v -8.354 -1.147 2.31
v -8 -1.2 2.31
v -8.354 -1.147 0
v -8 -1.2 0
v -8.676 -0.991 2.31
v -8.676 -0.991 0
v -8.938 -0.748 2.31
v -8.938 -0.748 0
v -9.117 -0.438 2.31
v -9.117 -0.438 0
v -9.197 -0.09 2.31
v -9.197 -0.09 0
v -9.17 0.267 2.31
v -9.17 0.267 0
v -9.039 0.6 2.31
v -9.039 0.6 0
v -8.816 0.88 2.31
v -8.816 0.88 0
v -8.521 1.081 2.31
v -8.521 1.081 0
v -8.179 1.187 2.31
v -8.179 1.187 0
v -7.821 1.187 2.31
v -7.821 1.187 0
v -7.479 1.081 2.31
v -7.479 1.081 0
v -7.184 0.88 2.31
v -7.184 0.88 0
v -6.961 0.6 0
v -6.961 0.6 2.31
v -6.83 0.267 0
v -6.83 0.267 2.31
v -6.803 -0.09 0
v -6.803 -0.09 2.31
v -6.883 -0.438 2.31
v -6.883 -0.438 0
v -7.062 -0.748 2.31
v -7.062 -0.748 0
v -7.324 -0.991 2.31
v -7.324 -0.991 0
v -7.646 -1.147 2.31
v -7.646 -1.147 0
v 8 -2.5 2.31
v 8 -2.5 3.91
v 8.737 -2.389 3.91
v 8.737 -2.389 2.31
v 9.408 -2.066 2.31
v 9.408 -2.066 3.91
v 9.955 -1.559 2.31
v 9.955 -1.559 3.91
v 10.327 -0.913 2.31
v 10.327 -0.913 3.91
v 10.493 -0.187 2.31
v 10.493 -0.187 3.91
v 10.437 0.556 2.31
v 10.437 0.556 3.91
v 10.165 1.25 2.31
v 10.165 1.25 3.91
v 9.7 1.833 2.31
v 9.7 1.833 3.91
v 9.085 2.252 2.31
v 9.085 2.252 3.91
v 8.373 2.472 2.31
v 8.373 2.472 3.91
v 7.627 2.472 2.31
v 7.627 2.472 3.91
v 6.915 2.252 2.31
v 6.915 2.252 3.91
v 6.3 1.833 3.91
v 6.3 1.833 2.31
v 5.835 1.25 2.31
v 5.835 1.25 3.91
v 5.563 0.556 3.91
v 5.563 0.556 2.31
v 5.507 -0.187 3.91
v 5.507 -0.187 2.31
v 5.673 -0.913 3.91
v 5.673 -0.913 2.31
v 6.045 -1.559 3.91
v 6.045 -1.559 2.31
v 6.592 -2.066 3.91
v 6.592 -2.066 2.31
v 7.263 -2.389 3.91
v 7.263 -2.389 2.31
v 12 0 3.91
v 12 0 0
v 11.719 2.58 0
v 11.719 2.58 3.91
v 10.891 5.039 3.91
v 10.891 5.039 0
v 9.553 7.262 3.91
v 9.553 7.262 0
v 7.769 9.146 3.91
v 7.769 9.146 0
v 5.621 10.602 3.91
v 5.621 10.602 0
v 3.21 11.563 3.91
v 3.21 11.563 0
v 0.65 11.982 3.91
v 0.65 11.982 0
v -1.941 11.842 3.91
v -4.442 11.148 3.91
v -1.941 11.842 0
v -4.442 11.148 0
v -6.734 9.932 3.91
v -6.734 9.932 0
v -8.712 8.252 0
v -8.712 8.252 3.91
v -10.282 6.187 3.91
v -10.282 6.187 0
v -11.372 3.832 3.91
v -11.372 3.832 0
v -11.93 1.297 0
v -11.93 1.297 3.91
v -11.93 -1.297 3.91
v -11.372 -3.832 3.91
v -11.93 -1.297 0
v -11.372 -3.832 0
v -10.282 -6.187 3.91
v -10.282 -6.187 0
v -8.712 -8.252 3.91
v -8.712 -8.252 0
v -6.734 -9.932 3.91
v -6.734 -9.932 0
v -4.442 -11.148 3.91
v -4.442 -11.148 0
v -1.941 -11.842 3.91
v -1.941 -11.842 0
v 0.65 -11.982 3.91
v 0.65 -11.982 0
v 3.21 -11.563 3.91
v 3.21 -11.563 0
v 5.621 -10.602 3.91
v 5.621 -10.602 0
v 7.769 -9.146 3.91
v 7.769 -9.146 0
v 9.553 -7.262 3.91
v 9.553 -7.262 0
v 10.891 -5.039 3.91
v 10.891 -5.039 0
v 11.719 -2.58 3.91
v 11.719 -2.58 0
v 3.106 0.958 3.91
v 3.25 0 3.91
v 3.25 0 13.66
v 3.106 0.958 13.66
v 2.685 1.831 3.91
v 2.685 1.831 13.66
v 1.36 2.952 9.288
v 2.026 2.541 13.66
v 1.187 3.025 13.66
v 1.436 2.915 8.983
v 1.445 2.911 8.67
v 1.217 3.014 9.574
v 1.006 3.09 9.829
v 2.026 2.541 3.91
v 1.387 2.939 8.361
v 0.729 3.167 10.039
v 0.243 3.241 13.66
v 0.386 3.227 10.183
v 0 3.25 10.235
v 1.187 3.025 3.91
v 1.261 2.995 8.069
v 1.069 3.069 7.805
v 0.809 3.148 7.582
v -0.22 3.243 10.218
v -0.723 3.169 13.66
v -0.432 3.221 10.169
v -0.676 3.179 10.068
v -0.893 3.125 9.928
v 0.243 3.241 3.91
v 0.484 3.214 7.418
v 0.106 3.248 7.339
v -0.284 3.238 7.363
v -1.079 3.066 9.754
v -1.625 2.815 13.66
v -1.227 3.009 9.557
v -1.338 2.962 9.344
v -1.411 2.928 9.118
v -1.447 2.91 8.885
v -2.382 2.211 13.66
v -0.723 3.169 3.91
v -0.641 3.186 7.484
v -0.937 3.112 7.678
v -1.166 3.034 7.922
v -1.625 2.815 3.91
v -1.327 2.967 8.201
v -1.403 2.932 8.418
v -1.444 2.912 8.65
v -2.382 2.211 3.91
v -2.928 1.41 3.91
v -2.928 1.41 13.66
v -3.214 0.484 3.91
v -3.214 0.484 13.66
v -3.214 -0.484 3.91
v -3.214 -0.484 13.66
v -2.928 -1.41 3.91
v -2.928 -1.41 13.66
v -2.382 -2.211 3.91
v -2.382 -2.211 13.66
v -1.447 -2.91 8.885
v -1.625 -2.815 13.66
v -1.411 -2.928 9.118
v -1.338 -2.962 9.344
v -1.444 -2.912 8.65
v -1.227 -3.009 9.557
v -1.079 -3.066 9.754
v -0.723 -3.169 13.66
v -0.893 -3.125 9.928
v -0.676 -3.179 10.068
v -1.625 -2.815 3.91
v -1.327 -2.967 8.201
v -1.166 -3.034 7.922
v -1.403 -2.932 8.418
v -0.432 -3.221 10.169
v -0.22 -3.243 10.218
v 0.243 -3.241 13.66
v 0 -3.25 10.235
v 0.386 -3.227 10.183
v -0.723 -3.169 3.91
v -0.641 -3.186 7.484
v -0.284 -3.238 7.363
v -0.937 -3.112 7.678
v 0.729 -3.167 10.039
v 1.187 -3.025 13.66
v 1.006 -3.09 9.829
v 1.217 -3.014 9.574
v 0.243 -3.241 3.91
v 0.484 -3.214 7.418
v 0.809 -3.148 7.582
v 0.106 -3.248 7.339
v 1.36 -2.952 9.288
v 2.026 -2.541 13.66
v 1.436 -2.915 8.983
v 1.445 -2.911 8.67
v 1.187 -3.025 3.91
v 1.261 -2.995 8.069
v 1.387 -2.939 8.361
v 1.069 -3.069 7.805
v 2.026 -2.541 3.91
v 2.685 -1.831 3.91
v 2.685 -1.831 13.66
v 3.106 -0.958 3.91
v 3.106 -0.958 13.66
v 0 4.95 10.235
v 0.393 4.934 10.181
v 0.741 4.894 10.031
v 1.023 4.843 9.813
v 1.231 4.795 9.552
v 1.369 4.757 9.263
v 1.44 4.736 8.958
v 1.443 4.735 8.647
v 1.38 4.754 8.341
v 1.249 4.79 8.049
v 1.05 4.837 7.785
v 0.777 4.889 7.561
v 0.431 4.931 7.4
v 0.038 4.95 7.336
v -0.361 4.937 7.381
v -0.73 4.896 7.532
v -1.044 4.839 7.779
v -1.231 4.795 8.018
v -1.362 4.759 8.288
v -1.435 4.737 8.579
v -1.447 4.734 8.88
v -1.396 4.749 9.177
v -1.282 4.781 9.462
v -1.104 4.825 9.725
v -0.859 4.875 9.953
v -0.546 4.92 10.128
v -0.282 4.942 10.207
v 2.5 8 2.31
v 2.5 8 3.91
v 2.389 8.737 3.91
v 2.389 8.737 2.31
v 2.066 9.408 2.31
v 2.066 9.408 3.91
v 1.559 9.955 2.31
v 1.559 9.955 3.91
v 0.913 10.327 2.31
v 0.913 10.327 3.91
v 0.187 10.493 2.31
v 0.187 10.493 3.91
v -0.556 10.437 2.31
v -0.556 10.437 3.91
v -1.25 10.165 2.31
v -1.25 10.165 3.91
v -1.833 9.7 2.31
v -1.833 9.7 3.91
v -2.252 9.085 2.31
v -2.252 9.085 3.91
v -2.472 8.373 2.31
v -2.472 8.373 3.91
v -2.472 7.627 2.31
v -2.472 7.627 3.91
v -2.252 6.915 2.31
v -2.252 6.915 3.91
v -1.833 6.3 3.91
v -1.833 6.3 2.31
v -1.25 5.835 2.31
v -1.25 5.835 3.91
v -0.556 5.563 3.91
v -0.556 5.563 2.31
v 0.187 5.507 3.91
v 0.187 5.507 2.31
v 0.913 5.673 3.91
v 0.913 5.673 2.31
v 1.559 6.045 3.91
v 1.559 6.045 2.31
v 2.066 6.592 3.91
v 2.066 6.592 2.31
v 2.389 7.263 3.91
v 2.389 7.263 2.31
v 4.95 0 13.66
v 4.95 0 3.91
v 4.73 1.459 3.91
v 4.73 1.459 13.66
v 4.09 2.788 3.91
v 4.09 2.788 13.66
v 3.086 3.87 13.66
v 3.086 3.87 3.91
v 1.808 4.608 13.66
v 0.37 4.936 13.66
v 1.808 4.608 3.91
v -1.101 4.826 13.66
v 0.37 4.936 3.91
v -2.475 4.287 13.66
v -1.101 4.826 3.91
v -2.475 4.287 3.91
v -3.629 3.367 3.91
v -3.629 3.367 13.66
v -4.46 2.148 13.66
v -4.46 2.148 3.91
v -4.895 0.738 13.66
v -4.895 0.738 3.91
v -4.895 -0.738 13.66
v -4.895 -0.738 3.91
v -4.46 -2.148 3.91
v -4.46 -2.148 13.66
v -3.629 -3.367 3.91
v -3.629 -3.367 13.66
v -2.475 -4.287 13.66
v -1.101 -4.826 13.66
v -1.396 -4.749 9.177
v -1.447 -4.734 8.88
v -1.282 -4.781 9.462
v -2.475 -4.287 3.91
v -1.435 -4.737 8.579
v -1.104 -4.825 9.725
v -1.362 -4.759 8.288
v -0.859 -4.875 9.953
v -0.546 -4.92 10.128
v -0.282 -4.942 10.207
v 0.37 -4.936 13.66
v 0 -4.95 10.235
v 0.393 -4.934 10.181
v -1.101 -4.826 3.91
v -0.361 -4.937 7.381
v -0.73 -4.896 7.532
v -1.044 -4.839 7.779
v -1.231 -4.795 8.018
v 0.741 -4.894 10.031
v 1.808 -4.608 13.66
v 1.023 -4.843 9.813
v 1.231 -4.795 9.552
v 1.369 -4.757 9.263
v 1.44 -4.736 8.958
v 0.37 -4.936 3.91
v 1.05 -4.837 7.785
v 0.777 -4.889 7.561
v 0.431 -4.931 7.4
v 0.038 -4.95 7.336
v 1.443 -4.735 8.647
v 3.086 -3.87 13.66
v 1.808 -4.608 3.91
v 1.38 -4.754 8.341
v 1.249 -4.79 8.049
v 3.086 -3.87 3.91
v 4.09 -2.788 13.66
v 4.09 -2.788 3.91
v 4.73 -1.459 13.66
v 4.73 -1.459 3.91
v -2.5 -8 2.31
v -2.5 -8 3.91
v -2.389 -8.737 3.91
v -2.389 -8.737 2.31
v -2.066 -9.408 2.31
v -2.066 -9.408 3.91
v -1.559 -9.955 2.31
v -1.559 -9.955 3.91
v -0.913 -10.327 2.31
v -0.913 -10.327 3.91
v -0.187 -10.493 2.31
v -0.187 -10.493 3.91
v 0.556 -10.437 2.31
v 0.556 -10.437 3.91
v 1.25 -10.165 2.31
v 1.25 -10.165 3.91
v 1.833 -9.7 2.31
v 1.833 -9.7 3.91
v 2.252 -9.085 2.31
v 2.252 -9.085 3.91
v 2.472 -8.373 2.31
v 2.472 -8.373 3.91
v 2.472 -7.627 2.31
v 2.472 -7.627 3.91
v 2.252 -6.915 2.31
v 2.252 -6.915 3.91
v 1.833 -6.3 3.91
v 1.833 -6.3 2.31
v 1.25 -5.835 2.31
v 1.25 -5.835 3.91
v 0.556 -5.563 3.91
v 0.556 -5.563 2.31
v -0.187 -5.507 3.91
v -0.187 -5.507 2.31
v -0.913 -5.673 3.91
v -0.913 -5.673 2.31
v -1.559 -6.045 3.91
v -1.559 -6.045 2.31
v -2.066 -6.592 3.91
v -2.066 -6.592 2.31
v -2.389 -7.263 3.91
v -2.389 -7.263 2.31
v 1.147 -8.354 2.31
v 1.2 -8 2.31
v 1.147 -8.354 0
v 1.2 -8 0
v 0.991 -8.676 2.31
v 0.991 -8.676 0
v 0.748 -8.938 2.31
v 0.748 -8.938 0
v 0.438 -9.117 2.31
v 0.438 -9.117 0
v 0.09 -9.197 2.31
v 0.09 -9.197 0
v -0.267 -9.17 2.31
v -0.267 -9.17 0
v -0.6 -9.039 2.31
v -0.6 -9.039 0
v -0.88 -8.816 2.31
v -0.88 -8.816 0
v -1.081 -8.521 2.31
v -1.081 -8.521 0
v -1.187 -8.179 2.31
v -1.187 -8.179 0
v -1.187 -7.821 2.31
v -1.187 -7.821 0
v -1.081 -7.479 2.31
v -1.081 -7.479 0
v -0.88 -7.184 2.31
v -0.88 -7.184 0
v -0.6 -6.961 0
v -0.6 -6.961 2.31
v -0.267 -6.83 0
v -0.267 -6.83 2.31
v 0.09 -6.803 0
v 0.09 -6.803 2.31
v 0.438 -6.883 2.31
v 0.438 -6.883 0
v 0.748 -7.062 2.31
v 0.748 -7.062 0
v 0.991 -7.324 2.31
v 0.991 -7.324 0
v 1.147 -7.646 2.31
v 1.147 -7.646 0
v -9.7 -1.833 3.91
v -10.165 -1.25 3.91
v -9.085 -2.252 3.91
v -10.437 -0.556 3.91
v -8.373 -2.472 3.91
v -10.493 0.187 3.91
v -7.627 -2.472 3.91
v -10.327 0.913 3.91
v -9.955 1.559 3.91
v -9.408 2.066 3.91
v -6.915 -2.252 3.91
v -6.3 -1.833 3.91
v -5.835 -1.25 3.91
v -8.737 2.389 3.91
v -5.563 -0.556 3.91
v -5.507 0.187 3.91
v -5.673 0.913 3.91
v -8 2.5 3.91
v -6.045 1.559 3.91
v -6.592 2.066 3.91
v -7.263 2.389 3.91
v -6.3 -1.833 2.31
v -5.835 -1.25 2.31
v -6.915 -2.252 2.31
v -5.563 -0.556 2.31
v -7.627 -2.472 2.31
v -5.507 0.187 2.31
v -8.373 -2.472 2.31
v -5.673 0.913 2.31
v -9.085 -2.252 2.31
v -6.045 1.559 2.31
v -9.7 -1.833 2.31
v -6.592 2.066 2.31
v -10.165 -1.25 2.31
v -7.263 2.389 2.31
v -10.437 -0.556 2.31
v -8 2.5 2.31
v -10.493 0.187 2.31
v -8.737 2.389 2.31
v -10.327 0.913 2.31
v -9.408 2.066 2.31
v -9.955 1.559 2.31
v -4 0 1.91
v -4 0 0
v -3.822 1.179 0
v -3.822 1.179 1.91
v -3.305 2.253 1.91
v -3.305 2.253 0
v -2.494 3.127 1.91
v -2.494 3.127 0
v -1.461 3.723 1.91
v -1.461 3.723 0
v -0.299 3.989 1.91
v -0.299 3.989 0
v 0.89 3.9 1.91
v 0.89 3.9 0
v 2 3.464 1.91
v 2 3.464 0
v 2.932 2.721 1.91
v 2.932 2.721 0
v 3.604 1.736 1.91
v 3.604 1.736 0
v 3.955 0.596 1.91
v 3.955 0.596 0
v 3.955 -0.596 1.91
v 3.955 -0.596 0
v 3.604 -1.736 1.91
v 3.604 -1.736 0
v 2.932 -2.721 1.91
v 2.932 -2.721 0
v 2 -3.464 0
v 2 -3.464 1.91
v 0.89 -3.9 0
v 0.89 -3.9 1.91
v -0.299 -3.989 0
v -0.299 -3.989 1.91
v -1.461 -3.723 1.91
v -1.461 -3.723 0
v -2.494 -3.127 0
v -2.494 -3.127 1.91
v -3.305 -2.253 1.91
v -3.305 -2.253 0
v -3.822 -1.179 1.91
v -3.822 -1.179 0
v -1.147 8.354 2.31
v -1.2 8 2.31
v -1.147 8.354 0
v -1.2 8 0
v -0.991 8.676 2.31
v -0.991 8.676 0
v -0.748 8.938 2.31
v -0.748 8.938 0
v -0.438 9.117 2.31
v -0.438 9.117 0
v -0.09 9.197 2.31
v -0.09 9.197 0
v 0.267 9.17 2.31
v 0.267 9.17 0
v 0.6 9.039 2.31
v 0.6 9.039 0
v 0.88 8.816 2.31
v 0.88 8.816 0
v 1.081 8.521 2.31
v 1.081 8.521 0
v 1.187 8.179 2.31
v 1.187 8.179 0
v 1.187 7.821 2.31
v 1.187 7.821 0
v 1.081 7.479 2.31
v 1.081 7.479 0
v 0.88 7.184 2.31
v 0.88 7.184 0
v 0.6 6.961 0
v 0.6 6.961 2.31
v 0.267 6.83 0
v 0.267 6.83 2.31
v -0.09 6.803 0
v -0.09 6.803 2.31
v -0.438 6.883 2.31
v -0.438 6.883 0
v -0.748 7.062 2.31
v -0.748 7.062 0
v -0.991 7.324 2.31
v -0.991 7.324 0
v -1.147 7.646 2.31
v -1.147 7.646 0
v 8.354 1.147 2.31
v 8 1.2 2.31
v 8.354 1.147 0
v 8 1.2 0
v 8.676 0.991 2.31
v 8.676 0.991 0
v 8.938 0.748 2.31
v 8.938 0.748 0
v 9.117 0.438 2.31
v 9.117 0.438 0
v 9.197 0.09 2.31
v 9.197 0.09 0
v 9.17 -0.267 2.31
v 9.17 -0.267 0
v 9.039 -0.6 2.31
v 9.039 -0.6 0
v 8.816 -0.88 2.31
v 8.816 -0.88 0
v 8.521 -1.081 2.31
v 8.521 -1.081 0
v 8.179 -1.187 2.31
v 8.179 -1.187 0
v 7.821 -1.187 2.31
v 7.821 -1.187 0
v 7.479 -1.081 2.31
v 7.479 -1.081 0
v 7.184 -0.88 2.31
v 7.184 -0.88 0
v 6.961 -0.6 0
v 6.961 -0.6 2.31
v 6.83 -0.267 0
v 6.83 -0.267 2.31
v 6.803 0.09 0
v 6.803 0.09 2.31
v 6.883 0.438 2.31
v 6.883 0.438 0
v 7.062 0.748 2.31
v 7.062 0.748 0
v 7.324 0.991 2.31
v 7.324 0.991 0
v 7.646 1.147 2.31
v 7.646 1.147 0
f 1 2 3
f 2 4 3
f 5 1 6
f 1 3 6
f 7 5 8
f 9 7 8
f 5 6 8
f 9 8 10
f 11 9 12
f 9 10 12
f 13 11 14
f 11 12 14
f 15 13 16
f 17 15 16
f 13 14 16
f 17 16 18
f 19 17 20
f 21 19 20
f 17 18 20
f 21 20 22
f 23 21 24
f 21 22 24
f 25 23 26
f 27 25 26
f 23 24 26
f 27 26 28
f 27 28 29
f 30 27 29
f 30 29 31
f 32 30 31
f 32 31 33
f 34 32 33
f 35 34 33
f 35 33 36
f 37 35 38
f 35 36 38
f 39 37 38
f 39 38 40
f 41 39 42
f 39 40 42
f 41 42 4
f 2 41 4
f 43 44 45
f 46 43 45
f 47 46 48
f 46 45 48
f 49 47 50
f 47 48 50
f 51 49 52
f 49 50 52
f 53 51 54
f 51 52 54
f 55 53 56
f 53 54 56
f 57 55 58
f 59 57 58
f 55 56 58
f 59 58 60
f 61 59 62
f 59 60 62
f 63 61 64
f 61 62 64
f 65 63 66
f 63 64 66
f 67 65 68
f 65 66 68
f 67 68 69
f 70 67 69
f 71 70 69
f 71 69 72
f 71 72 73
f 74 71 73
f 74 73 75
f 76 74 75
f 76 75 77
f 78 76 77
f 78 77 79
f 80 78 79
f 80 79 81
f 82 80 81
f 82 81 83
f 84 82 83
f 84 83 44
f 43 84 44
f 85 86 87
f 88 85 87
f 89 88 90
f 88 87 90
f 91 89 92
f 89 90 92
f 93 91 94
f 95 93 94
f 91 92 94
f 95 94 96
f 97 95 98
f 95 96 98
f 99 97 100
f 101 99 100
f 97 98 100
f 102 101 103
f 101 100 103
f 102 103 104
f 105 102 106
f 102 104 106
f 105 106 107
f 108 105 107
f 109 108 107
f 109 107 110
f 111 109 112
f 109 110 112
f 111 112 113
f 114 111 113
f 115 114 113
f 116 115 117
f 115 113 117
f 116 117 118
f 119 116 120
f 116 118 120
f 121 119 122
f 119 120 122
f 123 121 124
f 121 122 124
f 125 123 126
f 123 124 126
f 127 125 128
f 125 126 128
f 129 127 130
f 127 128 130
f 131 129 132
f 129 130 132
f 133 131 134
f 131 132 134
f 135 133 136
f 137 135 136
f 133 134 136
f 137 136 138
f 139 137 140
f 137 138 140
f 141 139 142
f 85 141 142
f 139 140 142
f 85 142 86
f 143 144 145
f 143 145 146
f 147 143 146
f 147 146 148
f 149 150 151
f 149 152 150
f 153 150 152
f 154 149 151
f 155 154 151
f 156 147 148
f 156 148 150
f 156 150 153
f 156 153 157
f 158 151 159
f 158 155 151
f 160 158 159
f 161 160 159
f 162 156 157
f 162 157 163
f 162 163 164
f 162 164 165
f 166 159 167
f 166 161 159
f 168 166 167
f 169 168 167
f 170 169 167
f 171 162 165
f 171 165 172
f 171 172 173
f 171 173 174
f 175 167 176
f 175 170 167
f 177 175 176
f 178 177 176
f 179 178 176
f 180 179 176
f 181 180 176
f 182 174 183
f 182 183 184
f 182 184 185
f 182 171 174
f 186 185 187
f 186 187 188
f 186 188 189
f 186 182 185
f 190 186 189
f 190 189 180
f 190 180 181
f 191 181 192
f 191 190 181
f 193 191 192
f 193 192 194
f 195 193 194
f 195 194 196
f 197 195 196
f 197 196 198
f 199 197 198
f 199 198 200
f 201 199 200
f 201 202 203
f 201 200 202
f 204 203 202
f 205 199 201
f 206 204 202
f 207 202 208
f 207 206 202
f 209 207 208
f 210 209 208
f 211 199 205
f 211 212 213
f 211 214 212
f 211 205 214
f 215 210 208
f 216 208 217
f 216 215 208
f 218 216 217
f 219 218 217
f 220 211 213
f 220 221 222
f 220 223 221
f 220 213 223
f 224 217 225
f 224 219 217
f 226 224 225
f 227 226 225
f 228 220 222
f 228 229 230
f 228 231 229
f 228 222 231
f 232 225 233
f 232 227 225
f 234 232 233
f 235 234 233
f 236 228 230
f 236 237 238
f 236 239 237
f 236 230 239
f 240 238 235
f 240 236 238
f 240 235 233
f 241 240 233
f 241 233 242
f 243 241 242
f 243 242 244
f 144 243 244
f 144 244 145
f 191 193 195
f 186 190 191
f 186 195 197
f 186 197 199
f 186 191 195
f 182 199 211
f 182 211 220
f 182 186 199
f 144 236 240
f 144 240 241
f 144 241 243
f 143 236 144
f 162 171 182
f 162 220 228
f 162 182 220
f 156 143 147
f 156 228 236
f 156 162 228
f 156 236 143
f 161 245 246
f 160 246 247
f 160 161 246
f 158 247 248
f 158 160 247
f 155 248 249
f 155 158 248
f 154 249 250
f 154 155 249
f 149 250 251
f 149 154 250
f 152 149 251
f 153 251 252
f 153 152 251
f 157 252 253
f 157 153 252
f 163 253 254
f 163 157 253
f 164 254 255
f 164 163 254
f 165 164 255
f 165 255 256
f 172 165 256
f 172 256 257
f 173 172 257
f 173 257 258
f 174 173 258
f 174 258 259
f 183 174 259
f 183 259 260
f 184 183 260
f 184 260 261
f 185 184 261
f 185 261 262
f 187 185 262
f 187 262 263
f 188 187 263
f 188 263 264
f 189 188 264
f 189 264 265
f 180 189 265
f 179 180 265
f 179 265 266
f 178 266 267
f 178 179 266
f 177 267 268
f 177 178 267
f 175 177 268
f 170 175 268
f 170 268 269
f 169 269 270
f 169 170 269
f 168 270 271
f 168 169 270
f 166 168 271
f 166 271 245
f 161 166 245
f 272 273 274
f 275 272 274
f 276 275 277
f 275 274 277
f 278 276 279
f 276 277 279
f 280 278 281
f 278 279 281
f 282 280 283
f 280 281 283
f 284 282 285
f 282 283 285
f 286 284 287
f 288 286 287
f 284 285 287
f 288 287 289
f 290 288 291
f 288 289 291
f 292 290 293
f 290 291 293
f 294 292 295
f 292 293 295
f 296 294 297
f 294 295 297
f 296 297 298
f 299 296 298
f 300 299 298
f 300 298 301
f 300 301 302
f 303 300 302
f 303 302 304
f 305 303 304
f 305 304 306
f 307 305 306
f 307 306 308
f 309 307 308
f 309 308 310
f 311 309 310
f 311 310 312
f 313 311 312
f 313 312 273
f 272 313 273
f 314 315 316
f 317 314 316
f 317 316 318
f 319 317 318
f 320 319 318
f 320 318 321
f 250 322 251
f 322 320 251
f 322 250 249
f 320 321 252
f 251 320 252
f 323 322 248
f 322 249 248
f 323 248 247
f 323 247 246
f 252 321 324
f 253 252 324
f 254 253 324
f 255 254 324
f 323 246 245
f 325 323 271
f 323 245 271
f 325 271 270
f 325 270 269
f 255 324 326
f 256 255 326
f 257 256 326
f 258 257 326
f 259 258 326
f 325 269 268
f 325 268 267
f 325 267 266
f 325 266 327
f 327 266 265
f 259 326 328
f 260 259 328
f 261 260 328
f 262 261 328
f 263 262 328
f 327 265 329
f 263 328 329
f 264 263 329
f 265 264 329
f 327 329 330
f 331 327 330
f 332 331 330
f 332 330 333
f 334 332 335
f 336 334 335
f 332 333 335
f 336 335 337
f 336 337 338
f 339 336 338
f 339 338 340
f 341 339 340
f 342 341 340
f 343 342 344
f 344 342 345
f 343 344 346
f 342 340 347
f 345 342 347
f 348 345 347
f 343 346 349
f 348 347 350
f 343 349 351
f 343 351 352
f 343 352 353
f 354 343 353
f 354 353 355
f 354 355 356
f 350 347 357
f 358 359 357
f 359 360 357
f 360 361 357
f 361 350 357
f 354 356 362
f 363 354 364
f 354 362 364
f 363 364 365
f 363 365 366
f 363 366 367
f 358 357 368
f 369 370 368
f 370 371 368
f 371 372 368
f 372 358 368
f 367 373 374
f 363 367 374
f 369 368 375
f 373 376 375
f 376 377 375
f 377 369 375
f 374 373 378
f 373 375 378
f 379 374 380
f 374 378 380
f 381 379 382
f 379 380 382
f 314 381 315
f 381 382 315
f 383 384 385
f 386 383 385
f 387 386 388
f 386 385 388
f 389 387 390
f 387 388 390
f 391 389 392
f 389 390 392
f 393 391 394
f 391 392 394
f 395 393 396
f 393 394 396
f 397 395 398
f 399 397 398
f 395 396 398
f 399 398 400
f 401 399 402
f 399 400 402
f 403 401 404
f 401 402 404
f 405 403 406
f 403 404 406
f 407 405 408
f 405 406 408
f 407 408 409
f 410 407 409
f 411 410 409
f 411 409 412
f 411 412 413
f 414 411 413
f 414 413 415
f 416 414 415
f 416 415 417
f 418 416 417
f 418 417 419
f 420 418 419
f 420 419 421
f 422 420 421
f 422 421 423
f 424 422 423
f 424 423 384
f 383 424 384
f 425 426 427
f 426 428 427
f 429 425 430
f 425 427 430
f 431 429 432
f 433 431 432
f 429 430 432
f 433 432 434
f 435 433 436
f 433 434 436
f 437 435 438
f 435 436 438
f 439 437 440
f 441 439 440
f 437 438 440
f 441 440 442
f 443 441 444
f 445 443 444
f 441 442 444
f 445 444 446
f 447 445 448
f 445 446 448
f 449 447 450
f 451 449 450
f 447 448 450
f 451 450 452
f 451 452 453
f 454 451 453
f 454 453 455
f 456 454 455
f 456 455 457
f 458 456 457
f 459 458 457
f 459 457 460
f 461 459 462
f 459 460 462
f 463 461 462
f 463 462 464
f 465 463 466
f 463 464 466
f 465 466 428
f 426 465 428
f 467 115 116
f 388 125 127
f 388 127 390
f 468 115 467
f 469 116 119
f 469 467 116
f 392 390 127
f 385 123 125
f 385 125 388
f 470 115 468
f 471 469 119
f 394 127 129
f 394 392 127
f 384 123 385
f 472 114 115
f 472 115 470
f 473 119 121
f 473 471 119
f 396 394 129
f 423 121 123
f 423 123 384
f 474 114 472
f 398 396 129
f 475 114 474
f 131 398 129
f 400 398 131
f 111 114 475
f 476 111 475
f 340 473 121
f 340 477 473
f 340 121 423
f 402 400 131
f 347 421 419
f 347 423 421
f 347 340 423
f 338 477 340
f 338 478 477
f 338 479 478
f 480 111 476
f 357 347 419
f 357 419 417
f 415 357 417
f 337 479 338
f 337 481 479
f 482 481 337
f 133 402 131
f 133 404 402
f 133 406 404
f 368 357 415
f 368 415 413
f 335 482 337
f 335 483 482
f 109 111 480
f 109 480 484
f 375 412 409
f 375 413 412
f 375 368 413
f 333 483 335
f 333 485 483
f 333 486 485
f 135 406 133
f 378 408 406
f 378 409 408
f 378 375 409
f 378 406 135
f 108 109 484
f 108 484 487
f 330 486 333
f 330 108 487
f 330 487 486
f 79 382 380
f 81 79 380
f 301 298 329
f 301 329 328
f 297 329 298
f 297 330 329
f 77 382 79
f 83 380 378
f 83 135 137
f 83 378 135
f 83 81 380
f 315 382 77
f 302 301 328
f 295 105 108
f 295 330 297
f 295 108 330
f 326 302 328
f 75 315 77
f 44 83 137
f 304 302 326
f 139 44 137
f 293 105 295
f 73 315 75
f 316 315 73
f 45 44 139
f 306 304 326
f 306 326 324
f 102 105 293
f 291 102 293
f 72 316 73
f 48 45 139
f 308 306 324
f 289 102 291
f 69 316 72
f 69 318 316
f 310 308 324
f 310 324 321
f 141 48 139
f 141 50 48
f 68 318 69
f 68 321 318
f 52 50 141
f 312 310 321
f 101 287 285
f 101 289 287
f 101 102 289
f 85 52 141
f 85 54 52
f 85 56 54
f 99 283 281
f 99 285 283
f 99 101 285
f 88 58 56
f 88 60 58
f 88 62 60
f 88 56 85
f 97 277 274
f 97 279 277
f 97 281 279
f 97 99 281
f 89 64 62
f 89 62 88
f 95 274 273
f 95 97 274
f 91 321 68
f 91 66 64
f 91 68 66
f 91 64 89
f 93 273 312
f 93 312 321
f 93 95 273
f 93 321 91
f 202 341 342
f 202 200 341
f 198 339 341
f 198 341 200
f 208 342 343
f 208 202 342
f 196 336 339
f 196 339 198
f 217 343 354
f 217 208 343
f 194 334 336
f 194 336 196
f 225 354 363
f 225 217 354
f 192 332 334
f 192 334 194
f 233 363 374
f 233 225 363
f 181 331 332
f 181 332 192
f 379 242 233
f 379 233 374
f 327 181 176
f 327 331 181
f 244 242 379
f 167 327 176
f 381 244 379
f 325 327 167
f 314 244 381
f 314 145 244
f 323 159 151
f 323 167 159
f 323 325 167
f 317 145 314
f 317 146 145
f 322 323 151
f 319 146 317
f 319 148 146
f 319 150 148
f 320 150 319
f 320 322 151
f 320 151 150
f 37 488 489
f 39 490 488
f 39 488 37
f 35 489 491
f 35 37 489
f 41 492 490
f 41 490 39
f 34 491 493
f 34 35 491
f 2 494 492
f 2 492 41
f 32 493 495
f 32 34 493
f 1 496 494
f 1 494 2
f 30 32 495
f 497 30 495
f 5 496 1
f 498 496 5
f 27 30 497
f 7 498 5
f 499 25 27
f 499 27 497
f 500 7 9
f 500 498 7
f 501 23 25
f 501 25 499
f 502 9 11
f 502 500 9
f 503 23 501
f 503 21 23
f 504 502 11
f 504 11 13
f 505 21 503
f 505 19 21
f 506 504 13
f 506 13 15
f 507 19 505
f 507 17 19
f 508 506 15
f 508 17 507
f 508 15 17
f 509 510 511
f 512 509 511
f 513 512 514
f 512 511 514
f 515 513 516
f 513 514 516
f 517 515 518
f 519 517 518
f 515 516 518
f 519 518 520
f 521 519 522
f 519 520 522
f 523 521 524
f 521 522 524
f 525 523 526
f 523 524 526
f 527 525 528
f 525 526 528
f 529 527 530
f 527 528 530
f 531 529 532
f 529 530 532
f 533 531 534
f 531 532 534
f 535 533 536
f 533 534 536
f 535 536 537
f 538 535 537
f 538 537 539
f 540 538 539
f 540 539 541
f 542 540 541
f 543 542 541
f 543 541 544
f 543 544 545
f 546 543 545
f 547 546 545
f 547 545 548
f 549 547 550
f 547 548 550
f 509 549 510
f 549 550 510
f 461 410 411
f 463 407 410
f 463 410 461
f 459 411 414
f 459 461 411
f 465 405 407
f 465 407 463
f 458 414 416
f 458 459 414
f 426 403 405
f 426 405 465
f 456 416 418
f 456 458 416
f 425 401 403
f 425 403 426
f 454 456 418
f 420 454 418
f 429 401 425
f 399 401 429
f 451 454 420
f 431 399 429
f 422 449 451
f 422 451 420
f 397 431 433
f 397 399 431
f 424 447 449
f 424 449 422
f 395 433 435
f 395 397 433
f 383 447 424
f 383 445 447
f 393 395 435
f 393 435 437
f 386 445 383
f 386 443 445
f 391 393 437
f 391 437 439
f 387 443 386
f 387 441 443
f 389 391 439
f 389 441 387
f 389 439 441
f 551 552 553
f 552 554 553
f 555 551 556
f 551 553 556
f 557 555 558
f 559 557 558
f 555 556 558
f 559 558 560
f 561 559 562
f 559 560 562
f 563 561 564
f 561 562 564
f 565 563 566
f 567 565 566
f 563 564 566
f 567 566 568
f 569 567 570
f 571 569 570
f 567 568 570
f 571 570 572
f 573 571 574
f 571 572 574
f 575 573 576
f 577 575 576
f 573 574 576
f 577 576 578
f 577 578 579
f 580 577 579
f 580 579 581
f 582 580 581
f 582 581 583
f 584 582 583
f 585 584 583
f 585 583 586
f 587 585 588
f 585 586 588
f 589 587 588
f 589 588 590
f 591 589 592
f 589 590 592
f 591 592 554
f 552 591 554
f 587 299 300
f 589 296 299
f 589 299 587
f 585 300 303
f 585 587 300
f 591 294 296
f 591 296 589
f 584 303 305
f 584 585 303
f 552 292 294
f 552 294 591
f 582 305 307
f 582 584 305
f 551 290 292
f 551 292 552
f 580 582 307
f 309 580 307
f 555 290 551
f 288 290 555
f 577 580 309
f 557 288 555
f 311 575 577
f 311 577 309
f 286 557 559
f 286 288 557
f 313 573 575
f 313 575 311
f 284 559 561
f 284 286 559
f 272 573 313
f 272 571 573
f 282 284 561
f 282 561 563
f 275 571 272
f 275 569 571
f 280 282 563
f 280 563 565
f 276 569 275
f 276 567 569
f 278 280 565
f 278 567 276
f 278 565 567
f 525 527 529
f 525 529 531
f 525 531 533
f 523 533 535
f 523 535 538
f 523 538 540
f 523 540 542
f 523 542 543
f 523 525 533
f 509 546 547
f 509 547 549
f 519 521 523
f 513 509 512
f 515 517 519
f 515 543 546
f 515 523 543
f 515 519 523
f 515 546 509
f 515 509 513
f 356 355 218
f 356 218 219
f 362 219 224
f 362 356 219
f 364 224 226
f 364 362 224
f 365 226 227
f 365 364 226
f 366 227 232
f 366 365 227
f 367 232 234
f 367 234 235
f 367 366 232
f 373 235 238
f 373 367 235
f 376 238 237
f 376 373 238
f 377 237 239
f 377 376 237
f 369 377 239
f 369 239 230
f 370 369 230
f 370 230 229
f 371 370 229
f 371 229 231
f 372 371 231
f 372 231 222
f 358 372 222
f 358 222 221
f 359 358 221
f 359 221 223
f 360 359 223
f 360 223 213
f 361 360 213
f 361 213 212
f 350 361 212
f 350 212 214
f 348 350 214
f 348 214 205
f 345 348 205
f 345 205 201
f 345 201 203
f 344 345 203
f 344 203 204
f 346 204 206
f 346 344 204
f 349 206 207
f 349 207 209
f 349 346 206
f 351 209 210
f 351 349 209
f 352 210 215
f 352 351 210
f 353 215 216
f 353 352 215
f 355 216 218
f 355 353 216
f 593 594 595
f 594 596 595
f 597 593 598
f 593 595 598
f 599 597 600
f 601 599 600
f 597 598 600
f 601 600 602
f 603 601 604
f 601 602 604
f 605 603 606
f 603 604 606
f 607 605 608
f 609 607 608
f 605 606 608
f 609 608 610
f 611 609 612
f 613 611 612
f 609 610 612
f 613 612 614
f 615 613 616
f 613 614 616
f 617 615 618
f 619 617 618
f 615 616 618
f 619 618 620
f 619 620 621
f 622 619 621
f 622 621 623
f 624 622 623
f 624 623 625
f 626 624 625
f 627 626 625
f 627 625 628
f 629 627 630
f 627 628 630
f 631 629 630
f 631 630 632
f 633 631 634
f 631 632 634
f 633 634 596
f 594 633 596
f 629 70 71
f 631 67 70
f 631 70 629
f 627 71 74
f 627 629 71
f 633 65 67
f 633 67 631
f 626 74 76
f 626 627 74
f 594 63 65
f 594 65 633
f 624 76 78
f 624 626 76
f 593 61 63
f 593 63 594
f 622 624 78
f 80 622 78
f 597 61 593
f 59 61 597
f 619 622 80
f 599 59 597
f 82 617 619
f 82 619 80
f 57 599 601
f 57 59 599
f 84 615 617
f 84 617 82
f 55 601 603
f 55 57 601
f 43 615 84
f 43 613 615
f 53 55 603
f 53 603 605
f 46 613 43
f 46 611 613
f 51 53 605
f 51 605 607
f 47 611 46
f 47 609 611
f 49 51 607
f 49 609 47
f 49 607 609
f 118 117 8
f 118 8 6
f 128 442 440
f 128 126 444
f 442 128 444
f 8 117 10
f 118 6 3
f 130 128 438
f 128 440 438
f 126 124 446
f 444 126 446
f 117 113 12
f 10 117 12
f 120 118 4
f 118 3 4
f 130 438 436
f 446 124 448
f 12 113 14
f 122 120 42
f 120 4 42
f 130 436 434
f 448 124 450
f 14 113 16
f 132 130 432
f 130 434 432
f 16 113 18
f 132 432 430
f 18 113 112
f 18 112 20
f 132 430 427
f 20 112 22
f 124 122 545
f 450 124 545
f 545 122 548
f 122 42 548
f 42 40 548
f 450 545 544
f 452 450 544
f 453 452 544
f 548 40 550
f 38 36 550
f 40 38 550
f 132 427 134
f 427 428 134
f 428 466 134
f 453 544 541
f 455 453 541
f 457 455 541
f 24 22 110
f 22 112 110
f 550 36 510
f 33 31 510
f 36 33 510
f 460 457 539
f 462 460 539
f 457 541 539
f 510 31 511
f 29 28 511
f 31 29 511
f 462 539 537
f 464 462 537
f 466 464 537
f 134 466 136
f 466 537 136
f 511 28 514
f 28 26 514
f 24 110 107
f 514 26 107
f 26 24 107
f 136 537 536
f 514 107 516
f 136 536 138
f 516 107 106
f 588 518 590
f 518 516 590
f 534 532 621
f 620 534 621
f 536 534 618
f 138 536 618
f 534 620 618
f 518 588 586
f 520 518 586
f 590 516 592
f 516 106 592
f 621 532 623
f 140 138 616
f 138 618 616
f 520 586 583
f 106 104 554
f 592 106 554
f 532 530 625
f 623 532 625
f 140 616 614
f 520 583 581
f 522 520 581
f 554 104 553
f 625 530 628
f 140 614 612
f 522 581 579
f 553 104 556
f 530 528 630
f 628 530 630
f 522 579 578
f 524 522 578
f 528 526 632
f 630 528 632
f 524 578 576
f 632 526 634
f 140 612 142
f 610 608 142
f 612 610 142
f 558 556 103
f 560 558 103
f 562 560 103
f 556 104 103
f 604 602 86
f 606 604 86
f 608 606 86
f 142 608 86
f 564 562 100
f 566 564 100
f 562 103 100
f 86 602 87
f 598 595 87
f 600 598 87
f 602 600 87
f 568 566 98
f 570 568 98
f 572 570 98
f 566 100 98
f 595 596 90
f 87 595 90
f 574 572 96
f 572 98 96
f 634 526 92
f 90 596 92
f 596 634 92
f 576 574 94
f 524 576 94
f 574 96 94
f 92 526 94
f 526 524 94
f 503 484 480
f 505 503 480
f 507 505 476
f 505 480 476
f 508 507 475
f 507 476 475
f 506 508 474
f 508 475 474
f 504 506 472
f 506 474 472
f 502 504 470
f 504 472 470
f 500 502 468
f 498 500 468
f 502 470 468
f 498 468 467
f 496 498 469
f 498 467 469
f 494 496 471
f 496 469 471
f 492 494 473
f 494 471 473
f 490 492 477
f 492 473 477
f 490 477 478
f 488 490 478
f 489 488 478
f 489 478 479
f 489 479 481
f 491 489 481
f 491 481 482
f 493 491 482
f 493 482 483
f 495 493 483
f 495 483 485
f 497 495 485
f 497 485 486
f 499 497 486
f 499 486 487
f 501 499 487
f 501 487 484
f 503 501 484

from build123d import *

# Parameters (mm, degrees)
ESQUISSE1_R                                        = 12
BOSS_EXTRU_1_DEPTH                                 = 3.91
ESQUISSE6_R                                        = 4
ENL_V_MAT_EXTRU_2_DEPTH                            = 1.91
ESQUISSE7_R                                        = 4.95
ESQUISSE7_R_2                                      = 3.25
BOSS_EXTRU_2_DEPTH                                 = 9.75
CHAMBRAGE_POUR_VIS_T_TE_RONDE_BOMB_E_M_D           = 2.4
CHAMBRAGE_POUR_VIS_T_TE_RONDE_BOMB_E_M_CBORE_D     = 5
CHAMBRAGE_POUR_VIS_T_TE_RONDE_BOMB_E_M_CBORE_DEPTH = 1.6
R_P_TITION_CIRCULAIRE2_COUNT                       = 4
ENL_V_MAT_EXTRU_3_DEPTH                            = 22.78521517
ENL_V_MAT_EXTRU_3_DEPTH_BACK                       = 22.78521517
ESQUISSE12_R                                       = 1.45


with BuildPart() as part:
    # Esquisse1 → Boss.-Extru.1 (new body)
    with BuildSketch(Plane.XY):
        Circle(ESQUISSE1_R)
    extrude(amount=BOSS_EXTRU_1_DEPTH)

    # Esquisse6 → Enlèv. mat.-Extru.2 (cut)
    with BuildSketch(Plane(origin=(0, 0, 0), x_dir=(-1, 0, 0), z_dir=(0, 0, -1))):
        Circle(ESQUISSE6_R)
    extrude(amount=-ENL_V_MAT_EXTRU_2_DEPTH, mode=Mode.SUBTRACT)

    # Esquisse7 → Boss.-Extru.2 (add)
    with BuildSketch(Plane.XY.offset(3.91)):
        Circle(ESQUISSE7_R)
        Circle(ESQUISSE7_R_2, mode=Mode.SUBTRACT)
    extrude(amount=BOSS_EXTRU_2_DEPTH)

    # Chambrage pour vis à tête ronde bombée M21 (through all)
    with Locations(Plane.XY.offset(3.91)):
        with Locations((0, 8)):
            chambrage_pour_vis_t_te_ronde_bomb_e_m = CounterBoreHole(CHAMBRAGE_POUR_VIS_T_TE_RONDE_BOMB_E_M_D / 2, CHAMBRAGE_POUR_VIS_T_TE_RONDE_BOMB_E_M_CBORE_D / 2, CHAMBRAGE_POUR_VIS_T_TE_RONDE_BOMB_E_M_CBORE_DEPTH)

    # Répétition circulaire2: Chambrage pour vis à tête ronde bombée M21 ×4 about axis
    r_p_tition_circulaire2_axis = Axis((0, 0, 0), (0, 0, 1))
    for i in range(1, R_P_TITION_CIRCULAIRE2_COUNT):
        add(chambrage_pour_vis_t_te_ronde_bomb_e_m.rotate(r_p_tition_circulaire2_axis, i * 360 / R_P_TITION_CIRCULAIRE2_COUNT), mode=Mode.SUBTRACT)

    # Esquisse12 → Enlèv. mat.-Extru.3 (cut, two sides: drawn at the far end of the back side and taken through both)
    with BuildSketch(Plane(origin=(0, 0, 0), x_dir=(1, 0, 0), z_dir=(0, 1, 0)).offset(-ENL_V_MAT_EXTRU_3_DEPTH_BACK)):
        with Locations(Location((0, -8.785, 0), (0, 0, 270))):
            Circle(ESQUISSE12_R)
    extrude(amount=ENL_V_MAT_EXTRU_3_DEPTH + ENL_V_MAT_EXTRU_3_DEPTH_BACK, mode=Mode.SUBTRACT)


solid = part.part
